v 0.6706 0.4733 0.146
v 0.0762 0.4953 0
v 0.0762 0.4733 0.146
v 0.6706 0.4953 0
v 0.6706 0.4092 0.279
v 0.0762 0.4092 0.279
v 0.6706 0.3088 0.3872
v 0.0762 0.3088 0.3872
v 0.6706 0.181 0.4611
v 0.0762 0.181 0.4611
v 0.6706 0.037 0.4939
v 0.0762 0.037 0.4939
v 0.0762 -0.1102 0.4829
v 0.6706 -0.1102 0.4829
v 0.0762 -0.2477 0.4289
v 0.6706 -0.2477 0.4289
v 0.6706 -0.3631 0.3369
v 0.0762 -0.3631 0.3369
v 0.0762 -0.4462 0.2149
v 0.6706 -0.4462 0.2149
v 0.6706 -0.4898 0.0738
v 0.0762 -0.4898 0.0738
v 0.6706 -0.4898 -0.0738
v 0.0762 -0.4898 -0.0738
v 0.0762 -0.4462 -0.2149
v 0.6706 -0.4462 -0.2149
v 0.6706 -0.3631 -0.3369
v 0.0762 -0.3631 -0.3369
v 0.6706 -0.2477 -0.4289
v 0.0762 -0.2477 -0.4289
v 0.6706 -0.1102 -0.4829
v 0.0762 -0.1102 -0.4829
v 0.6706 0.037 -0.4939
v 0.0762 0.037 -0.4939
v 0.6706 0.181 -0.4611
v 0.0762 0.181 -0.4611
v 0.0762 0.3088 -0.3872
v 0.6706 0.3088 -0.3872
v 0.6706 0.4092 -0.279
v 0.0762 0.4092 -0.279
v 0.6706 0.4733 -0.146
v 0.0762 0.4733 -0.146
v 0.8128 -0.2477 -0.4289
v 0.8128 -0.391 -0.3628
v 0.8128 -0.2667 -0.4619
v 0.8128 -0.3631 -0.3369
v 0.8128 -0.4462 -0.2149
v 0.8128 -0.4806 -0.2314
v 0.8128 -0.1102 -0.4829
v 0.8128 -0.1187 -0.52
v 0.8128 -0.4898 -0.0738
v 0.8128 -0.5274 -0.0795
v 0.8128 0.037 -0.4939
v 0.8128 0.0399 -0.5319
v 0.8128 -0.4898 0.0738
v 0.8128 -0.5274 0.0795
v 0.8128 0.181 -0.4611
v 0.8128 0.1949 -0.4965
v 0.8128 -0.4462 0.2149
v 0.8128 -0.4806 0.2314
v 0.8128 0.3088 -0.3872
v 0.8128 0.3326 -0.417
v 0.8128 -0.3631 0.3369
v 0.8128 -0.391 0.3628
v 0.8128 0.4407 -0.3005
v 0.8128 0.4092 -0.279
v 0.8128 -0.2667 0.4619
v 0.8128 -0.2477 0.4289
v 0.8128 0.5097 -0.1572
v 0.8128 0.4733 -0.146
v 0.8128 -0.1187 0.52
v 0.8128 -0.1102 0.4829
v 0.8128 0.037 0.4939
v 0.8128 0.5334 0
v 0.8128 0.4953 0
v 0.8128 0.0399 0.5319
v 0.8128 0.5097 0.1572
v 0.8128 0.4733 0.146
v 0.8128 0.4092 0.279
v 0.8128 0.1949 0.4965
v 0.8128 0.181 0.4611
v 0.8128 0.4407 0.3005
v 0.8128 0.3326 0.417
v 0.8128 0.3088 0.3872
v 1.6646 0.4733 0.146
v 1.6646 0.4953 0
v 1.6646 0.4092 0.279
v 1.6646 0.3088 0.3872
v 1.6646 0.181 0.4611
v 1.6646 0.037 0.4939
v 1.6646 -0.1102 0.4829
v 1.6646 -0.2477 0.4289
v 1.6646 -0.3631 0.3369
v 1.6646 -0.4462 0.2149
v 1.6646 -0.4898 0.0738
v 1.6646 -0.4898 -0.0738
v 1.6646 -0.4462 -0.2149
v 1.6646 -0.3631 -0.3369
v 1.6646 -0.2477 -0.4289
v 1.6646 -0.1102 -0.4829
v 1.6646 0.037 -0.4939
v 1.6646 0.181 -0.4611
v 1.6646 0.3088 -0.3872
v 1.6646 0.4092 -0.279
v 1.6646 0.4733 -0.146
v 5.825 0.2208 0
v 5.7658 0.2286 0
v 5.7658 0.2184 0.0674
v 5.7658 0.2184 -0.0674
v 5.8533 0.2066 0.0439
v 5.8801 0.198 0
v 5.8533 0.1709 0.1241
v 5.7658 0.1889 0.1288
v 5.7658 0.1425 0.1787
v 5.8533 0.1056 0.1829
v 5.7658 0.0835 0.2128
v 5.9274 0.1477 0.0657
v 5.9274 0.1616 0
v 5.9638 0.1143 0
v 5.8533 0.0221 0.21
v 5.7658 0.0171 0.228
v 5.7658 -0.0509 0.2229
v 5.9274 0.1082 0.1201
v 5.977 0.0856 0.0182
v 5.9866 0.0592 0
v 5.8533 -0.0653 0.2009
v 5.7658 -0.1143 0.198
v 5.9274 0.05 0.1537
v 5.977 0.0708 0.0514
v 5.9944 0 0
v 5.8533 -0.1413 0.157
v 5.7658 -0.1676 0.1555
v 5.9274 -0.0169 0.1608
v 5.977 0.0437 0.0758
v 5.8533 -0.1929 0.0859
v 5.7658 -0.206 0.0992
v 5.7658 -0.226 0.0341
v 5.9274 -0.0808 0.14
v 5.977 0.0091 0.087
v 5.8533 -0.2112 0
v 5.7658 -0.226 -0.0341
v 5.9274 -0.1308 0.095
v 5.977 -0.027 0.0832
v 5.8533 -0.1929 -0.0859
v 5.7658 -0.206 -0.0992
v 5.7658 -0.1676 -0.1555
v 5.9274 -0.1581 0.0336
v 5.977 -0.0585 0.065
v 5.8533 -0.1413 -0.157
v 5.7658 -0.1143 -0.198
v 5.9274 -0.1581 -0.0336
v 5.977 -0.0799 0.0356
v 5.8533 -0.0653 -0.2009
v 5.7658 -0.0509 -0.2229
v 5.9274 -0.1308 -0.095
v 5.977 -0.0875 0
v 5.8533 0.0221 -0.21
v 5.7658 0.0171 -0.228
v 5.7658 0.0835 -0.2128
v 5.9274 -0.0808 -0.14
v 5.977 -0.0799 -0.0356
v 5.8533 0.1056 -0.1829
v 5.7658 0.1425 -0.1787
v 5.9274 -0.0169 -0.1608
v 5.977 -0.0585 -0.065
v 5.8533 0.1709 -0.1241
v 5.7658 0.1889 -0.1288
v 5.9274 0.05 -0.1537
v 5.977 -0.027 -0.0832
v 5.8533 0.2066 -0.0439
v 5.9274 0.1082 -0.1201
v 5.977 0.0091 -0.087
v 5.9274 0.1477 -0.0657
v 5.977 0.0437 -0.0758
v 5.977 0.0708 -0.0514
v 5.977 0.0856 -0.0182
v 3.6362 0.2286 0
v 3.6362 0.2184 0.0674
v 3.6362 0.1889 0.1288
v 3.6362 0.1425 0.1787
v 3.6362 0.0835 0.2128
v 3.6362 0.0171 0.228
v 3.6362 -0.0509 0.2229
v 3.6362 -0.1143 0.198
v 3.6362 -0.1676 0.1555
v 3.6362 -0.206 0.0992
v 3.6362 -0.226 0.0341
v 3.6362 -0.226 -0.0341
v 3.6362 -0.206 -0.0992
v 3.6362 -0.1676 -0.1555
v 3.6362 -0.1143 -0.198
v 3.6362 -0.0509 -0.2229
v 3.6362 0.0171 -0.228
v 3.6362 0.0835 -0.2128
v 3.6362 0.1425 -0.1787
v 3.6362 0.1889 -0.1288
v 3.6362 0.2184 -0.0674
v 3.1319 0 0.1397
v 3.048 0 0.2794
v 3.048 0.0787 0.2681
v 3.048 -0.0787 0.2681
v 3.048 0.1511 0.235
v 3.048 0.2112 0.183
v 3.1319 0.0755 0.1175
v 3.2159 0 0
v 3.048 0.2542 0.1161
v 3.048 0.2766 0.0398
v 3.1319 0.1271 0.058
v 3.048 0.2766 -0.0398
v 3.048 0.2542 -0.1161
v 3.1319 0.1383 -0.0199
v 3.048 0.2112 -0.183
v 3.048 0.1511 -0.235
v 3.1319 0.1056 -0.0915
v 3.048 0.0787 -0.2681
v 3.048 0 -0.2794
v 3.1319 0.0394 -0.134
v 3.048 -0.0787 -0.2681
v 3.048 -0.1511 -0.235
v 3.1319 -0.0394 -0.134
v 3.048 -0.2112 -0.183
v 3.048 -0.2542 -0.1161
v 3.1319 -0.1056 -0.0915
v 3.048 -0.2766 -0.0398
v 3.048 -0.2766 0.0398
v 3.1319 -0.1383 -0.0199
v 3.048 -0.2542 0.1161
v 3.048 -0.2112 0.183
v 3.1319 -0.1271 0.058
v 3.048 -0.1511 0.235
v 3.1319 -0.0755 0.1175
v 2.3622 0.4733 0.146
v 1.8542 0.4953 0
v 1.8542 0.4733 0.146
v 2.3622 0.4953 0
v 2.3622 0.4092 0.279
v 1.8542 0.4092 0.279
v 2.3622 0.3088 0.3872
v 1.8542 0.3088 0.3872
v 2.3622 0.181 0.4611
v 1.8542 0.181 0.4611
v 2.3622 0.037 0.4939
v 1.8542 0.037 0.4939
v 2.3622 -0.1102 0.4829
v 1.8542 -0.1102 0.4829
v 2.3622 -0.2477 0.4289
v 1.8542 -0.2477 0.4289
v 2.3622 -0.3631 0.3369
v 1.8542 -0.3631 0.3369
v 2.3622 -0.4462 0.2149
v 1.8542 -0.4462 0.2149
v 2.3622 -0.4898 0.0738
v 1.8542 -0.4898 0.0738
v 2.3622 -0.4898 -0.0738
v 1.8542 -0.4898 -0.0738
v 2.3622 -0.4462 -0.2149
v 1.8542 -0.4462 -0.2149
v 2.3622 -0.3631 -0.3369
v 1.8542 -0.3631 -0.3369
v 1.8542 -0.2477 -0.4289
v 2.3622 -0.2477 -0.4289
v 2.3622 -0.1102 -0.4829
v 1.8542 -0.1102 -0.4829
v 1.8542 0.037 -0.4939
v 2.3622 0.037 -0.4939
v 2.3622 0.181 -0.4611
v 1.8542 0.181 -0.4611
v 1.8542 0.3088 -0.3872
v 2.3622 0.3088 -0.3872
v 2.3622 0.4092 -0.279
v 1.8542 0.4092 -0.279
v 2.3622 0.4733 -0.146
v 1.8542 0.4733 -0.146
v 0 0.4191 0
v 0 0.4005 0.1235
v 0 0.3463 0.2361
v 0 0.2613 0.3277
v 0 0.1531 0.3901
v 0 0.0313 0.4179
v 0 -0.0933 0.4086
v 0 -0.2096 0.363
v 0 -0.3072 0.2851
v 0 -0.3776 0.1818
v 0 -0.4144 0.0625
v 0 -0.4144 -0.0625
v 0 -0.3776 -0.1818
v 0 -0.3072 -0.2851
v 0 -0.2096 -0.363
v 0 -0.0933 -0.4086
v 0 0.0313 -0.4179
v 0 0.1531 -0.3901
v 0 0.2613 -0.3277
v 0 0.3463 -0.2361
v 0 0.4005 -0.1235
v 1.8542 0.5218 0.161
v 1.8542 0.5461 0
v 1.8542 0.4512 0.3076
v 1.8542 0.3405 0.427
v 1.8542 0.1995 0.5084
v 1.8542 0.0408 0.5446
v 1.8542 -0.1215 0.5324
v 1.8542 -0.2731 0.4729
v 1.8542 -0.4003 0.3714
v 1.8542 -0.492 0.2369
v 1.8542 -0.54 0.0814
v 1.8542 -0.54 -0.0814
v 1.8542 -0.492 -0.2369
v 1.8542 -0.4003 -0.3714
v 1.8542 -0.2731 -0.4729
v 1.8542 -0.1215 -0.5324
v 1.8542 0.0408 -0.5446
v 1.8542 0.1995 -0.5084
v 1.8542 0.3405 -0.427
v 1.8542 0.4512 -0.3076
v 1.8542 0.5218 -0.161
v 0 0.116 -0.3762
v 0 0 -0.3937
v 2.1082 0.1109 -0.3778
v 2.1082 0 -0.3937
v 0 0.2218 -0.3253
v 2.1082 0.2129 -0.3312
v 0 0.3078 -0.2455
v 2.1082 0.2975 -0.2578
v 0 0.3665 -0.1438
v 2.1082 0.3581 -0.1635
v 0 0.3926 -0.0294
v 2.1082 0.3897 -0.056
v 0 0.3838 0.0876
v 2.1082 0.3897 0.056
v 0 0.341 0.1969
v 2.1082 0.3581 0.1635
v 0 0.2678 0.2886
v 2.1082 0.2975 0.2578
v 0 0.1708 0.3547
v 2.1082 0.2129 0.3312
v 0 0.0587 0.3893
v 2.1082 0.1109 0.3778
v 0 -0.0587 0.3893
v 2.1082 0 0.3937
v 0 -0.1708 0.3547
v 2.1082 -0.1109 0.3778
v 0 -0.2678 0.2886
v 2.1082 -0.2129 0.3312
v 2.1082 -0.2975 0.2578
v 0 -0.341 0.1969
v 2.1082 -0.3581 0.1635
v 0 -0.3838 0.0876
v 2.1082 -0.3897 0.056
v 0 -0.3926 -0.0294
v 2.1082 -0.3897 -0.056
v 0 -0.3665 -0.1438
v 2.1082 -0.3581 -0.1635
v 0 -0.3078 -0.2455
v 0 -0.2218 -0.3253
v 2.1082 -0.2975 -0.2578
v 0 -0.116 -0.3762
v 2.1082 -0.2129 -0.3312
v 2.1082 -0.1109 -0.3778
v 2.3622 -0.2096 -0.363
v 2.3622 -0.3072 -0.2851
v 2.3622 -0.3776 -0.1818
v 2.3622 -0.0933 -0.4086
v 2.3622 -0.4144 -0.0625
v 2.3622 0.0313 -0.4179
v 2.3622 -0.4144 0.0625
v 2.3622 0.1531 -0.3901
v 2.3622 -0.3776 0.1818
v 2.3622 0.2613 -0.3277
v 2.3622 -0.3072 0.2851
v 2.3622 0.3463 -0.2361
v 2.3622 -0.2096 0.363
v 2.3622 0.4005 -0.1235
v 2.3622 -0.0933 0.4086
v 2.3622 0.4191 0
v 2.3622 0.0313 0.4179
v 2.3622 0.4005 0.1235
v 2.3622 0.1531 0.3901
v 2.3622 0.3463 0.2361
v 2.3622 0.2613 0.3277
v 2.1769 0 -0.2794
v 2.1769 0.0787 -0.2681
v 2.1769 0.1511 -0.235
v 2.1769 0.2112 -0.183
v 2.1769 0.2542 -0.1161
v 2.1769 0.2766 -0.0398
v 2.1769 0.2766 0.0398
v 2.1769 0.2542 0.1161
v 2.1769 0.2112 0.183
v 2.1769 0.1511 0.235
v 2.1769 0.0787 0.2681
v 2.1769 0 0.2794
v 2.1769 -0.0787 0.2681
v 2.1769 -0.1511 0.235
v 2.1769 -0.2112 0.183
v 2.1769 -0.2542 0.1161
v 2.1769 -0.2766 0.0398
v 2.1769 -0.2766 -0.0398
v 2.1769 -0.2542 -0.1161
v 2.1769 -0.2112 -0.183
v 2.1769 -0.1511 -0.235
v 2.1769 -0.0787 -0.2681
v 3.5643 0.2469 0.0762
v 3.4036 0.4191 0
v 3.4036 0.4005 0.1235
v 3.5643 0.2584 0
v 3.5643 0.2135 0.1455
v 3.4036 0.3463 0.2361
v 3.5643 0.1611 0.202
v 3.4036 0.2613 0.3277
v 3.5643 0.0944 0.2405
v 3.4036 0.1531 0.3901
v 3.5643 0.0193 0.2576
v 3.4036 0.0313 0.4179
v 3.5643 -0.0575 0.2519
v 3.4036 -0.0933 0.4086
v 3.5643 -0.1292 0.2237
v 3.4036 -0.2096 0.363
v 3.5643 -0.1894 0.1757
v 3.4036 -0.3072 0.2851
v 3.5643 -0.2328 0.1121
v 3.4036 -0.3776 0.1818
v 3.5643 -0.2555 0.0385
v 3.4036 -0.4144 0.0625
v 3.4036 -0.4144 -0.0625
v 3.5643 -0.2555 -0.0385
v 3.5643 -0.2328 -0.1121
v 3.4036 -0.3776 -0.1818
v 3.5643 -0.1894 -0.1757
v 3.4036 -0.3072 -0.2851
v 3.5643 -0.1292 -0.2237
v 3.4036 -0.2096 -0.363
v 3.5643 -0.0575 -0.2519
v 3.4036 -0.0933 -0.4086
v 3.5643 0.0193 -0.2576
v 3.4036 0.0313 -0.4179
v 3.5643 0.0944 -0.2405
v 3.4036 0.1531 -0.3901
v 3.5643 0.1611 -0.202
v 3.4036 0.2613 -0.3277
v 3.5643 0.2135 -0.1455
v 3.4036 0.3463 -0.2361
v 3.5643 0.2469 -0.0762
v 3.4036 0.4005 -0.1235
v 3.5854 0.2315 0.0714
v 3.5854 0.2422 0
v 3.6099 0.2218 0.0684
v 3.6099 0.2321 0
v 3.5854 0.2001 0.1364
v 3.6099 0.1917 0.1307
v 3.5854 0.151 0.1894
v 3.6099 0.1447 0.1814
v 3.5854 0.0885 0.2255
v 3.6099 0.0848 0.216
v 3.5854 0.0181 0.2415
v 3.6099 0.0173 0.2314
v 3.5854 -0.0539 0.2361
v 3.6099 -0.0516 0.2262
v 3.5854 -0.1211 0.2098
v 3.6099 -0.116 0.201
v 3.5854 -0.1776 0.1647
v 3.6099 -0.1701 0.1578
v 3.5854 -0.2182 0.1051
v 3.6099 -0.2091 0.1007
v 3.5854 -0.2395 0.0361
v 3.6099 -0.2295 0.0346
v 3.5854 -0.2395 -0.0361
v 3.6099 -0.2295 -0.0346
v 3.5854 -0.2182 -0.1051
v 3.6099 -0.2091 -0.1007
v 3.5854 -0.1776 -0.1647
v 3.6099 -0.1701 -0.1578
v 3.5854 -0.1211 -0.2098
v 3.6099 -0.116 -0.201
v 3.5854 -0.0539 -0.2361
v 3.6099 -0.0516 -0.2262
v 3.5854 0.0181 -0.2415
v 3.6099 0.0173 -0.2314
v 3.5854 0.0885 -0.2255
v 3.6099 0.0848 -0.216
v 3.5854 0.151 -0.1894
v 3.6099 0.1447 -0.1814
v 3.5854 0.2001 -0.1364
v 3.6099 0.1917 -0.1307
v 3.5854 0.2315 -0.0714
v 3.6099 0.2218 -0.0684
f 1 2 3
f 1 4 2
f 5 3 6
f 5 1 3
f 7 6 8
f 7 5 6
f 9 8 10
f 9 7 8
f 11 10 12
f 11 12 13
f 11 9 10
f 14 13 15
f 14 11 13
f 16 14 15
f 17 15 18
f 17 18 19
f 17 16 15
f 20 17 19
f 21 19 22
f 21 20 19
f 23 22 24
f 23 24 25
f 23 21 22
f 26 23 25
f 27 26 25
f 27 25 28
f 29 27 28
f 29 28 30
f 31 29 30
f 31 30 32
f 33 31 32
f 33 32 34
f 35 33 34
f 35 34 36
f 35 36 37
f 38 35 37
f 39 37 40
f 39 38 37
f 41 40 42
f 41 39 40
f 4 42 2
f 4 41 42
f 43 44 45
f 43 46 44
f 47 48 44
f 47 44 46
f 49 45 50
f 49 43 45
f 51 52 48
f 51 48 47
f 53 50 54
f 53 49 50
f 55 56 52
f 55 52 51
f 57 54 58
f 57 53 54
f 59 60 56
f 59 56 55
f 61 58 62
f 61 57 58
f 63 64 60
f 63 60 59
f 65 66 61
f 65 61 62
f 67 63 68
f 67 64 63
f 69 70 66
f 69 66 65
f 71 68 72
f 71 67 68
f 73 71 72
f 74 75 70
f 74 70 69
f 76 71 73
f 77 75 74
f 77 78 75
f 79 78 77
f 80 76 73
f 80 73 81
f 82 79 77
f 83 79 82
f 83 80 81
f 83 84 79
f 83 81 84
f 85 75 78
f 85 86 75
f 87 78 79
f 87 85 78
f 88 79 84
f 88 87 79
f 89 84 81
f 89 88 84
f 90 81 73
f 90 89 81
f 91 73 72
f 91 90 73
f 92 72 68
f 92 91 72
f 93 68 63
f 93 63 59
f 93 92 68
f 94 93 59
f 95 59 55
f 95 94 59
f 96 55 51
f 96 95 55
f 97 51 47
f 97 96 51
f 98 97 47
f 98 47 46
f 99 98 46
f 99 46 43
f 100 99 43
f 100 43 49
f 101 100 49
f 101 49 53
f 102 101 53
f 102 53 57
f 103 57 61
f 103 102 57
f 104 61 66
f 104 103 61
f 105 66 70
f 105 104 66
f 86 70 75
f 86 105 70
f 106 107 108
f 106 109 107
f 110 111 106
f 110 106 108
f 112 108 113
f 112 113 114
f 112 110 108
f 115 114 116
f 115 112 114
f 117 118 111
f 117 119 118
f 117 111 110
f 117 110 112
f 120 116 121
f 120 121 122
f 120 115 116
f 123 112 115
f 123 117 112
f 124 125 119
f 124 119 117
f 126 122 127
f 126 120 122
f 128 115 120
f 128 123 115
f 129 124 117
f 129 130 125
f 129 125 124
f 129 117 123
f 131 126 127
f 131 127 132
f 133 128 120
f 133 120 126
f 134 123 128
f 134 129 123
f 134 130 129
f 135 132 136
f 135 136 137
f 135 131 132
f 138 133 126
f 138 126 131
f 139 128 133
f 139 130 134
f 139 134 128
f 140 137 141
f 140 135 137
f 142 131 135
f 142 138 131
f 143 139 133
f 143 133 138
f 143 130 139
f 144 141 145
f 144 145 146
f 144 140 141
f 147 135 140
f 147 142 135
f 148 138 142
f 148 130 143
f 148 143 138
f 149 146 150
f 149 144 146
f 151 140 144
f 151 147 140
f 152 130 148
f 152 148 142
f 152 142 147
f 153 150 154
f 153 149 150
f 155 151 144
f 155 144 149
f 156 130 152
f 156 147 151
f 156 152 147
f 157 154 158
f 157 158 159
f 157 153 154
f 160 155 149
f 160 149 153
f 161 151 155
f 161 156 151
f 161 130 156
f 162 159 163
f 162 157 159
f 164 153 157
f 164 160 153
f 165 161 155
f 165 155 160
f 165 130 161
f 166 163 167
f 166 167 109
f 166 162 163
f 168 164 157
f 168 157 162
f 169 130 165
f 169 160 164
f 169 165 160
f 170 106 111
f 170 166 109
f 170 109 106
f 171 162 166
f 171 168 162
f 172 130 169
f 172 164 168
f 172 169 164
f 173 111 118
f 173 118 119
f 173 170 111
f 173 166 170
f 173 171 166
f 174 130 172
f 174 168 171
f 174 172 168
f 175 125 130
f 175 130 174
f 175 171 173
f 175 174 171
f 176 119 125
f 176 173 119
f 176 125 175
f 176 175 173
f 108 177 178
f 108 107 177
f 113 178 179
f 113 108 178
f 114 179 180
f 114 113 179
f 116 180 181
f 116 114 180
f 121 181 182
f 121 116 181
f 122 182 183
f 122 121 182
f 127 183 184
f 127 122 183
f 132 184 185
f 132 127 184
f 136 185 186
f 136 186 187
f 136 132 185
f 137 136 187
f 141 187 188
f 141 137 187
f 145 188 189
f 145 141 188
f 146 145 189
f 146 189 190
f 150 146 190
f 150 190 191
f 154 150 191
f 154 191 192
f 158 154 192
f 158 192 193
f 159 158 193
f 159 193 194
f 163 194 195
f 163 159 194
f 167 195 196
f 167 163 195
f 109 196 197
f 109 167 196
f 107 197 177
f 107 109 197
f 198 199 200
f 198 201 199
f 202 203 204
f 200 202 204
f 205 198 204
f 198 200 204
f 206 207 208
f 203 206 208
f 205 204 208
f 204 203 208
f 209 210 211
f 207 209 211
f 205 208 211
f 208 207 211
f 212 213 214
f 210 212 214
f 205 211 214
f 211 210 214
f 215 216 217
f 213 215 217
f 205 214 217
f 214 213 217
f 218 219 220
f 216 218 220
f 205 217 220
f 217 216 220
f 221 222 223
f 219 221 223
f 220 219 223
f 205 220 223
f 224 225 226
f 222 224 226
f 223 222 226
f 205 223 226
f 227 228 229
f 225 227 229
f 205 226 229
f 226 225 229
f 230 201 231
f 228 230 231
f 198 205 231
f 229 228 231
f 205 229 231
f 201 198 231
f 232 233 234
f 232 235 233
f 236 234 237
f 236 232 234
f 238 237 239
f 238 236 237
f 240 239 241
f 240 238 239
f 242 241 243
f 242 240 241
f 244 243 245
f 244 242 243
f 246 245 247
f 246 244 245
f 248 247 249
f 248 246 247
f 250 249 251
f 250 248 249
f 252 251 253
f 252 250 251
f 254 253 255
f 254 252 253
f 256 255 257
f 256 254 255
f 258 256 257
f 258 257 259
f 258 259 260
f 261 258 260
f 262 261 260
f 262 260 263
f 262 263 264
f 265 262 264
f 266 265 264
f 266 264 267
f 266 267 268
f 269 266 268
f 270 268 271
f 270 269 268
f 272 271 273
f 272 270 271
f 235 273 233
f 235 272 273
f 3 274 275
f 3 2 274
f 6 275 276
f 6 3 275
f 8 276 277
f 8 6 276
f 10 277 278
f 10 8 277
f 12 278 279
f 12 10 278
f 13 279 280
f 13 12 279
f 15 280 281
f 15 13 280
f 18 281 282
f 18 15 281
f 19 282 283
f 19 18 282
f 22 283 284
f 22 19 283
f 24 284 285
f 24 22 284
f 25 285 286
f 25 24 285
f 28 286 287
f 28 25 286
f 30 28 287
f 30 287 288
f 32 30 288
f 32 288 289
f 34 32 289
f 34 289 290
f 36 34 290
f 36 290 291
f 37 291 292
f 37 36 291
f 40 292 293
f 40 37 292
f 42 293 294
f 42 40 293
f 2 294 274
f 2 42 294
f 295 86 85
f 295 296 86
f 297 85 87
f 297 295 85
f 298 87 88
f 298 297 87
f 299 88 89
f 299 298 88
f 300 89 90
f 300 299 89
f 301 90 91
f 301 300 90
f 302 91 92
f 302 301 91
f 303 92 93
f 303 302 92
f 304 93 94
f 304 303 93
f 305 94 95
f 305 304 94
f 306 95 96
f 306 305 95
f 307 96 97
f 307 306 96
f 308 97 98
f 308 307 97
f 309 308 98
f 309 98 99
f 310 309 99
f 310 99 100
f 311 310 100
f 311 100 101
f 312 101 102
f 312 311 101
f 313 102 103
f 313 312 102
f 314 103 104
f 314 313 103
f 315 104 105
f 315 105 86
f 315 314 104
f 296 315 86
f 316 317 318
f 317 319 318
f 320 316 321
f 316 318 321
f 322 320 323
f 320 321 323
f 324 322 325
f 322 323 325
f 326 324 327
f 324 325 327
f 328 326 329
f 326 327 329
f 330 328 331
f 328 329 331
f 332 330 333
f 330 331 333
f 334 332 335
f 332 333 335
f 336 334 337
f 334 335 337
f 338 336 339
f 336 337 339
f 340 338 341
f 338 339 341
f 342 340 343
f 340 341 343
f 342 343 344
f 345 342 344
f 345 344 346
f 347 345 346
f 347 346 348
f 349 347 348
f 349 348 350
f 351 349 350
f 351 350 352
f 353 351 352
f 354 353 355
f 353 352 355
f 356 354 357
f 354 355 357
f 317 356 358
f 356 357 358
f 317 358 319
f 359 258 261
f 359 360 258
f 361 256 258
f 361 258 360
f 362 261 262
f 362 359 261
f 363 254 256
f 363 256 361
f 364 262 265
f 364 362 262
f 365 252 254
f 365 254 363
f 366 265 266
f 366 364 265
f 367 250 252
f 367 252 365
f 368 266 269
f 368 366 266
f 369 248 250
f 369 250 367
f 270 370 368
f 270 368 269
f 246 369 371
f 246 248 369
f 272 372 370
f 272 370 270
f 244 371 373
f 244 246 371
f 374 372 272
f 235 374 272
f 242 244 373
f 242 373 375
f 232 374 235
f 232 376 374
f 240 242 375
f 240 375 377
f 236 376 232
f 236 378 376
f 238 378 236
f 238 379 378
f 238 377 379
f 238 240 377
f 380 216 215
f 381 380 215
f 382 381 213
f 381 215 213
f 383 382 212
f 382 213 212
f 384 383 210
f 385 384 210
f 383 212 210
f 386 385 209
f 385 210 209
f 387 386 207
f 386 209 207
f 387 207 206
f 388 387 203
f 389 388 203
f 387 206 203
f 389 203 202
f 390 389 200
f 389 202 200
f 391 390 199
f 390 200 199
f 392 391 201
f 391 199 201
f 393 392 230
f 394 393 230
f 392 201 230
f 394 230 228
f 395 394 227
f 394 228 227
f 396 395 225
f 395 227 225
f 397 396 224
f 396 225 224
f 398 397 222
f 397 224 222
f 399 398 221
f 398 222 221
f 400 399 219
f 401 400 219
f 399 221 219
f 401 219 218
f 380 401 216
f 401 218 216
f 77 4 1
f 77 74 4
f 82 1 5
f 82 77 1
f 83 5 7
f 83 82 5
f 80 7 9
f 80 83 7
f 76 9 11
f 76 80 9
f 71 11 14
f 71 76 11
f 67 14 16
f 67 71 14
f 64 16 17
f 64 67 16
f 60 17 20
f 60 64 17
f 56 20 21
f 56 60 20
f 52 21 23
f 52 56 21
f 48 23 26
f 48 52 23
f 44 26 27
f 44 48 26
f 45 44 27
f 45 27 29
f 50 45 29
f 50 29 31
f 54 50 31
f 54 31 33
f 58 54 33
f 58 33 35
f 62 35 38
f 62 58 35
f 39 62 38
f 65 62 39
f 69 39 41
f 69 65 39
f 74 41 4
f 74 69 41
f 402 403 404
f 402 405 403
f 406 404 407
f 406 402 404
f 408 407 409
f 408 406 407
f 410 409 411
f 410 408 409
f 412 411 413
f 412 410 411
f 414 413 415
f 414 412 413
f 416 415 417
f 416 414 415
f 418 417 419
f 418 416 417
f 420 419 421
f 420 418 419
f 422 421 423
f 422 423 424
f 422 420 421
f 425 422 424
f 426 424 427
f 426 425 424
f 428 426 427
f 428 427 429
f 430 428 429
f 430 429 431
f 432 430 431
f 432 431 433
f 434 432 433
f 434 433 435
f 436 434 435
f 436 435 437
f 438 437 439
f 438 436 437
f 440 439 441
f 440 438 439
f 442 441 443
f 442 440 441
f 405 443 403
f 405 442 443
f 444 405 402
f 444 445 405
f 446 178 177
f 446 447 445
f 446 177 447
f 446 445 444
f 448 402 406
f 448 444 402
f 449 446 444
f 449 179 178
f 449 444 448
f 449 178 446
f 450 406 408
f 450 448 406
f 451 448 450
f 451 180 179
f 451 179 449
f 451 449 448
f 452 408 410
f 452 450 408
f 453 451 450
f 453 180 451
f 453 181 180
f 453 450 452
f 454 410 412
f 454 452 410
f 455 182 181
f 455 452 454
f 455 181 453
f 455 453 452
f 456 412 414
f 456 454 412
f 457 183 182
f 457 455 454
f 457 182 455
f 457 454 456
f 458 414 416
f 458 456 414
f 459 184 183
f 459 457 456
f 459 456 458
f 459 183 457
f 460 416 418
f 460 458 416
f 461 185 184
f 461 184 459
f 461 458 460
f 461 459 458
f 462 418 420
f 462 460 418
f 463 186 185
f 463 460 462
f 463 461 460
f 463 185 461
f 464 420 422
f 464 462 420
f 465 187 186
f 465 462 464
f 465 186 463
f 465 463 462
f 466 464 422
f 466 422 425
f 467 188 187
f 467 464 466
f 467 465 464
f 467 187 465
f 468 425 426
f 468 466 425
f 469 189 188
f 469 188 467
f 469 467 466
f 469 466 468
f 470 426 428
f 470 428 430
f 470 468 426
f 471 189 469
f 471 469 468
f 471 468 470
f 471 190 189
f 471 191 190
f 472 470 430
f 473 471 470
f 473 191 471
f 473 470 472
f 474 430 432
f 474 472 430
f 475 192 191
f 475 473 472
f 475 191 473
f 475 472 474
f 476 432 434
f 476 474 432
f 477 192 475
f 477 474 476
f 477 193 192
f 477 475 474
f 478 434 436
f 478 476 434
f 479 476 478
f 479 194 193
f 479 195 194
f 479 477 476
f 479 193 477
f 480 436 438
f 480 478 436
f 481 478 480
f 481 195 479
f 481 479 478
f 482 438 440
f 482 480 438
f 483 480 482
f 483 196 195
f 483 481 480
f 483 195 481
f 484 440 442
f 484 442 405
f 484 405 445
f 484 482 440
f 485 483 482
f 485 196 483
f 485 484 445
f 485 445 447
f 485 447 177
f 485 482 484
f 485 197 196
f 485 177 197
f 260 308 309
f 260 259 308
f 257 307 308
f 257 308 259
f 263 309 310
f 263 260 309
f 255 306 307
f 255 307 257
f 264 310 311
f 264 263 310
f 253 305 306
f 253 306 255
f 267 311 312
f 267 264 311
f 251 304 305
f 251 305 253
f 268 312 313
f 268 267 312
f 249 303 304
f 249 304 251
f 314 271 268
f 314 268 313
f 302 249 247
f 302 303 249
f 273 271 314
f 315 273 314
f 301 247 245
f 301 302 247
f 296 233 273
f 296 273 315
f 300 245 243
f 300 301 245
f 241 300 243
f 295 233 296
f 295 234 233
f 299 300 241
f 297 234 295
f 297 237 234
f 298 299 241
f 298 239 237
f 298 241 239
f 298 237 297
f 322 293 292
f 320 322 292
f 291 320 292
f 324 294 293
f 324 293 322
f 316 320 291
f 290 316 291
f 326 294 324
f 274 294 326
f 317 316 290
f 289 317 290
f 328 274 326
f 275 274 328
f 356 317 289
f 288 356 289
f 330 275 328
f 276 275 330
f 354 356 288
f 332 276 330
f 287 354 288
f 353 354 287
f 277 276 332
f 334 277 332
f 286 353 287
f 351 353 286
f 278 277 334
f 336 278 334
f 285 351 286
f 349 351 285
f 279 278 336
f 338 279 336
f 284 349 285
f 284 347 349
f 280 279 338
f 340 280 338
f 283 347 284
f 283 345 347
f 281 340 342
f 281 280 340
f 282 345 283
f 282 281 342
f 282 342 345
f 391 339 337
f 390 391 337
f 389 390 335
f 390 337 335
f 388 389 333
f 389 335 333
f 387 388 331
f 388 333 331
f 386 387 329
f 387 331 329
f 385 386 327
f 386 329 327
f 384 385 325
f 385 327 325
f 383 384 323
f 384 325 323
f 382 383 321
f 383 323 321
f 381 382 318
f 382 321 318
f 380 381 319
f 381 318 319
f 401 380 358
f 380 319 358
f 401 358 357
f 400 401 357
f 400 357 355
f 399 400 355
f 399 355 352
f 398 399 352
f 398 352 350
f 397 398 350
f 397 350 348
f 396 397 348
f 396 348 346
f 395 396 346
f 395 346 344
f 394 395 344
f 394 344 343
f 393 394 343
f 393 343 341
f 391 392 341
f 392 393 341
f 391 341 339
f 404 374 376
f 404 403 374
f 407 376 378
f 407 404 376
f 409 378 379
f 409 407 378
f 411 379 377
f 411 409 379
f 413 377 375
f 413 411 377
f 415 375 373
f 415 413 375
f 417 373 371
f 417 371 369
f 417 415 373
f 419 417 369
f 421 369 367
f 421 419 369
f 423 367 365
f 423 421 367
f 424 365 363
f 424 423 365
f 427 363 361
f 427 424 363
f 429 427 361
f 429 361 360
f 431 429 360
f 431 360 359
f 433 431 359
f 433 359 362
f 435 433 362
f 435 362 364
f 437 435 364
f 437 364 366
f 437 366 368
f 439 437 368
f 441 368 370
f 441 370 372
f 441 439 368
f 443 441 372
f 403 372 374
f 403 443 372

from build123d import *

# Parameters (mm, degrees)
HOLE1_D     = 0.7874
HOLE1_DEPTH = 2.1082
HOLE1_TIP   = 0.236558826
HOLE2_D     = 0.5588
HOLE2_DEPTH = 3.048
HOLE2_TIP   = 0.167880457


with BuildPart() as part:
    # Sketch1 → RevolutionAngle1 (revolve)
    with BuildSketch(Plane.XY):
        with BuildLine():
            Line((0, 0), (0, 0.4191))
            Line((0, 0.4191), (0.0762, 0.4953))
            Line((0.0762, 0.4953), (0.670608864, 0.4953))
            Line((0.670608864, 0.4953), (0.8128, 0.5334))
            Line((0.8128, 0.5334), (0.8128, 0.4953))
            Line((0.8128, 0.4953), (1.664611819, 0.4953))
            Line((1.664611819, 0.4953), (1.8542, 0.5461))
            Line((1.8542, 0.5461), (1.8542, 0.4953))
            Line((1.8542, 0.4953), (2.3622, 0.4953))
            Line((2.3622, 0.4953), (2.3622, 0.4191))
            Line((2.3622, 0.4191), (3.4036, 0.4191))
            Line((3.4036, 0.4191), (3.564342049, 0.258357951))
            ThreePointArc((3.564342049, 0.258357951), (3.597303461, 0.236333839), (3.636184098, 0.2286))
            Line((3.636184098, 0.2286), (5.7658, 0.2286))
            ThreePointArc((5.7658, 0.2286), (5.92744461, 0.16164461), (5.9944, 0))
            Line((5.9944, 0), (0, 0))
        make_face()
    revolve(axis=Axis((0, 0, 0), (1, 0, 0)))

    # Hole1
    with Locations(Plane.ZY):
        with Locations((0, 0)):
            Hole(HOLE1_D / 2, depth=HOLE1_DEPTH)
            with Locations((0, 0, -(HOLE1_DEPTH + HOLE1_TIP / 2))):  # 118° drill point
                Cone(0, HOLE1_D / 2, HOLE1_TIP, mode=Mode.SUBTRACT)

    # Hole2
    with Locations(Plane(origin=(0, 0, 0.3937), x_dir=(0, 0, 1), z_dir=(-1, 0, 0))):
        with Locations((-0.3937, 0)):
            Hole(HOLE2_D / 2, depth=HOLE2_DEPTH)
            with Locations((0, 0, -(HOLE2_DEPTH + HOLE2_TIP / 2))):  # 118° drill point
                Cone(0, HOLE2_D / 2, HOLE2_TIP, mode=Mode.SUBTRACT)


solid = part.part
